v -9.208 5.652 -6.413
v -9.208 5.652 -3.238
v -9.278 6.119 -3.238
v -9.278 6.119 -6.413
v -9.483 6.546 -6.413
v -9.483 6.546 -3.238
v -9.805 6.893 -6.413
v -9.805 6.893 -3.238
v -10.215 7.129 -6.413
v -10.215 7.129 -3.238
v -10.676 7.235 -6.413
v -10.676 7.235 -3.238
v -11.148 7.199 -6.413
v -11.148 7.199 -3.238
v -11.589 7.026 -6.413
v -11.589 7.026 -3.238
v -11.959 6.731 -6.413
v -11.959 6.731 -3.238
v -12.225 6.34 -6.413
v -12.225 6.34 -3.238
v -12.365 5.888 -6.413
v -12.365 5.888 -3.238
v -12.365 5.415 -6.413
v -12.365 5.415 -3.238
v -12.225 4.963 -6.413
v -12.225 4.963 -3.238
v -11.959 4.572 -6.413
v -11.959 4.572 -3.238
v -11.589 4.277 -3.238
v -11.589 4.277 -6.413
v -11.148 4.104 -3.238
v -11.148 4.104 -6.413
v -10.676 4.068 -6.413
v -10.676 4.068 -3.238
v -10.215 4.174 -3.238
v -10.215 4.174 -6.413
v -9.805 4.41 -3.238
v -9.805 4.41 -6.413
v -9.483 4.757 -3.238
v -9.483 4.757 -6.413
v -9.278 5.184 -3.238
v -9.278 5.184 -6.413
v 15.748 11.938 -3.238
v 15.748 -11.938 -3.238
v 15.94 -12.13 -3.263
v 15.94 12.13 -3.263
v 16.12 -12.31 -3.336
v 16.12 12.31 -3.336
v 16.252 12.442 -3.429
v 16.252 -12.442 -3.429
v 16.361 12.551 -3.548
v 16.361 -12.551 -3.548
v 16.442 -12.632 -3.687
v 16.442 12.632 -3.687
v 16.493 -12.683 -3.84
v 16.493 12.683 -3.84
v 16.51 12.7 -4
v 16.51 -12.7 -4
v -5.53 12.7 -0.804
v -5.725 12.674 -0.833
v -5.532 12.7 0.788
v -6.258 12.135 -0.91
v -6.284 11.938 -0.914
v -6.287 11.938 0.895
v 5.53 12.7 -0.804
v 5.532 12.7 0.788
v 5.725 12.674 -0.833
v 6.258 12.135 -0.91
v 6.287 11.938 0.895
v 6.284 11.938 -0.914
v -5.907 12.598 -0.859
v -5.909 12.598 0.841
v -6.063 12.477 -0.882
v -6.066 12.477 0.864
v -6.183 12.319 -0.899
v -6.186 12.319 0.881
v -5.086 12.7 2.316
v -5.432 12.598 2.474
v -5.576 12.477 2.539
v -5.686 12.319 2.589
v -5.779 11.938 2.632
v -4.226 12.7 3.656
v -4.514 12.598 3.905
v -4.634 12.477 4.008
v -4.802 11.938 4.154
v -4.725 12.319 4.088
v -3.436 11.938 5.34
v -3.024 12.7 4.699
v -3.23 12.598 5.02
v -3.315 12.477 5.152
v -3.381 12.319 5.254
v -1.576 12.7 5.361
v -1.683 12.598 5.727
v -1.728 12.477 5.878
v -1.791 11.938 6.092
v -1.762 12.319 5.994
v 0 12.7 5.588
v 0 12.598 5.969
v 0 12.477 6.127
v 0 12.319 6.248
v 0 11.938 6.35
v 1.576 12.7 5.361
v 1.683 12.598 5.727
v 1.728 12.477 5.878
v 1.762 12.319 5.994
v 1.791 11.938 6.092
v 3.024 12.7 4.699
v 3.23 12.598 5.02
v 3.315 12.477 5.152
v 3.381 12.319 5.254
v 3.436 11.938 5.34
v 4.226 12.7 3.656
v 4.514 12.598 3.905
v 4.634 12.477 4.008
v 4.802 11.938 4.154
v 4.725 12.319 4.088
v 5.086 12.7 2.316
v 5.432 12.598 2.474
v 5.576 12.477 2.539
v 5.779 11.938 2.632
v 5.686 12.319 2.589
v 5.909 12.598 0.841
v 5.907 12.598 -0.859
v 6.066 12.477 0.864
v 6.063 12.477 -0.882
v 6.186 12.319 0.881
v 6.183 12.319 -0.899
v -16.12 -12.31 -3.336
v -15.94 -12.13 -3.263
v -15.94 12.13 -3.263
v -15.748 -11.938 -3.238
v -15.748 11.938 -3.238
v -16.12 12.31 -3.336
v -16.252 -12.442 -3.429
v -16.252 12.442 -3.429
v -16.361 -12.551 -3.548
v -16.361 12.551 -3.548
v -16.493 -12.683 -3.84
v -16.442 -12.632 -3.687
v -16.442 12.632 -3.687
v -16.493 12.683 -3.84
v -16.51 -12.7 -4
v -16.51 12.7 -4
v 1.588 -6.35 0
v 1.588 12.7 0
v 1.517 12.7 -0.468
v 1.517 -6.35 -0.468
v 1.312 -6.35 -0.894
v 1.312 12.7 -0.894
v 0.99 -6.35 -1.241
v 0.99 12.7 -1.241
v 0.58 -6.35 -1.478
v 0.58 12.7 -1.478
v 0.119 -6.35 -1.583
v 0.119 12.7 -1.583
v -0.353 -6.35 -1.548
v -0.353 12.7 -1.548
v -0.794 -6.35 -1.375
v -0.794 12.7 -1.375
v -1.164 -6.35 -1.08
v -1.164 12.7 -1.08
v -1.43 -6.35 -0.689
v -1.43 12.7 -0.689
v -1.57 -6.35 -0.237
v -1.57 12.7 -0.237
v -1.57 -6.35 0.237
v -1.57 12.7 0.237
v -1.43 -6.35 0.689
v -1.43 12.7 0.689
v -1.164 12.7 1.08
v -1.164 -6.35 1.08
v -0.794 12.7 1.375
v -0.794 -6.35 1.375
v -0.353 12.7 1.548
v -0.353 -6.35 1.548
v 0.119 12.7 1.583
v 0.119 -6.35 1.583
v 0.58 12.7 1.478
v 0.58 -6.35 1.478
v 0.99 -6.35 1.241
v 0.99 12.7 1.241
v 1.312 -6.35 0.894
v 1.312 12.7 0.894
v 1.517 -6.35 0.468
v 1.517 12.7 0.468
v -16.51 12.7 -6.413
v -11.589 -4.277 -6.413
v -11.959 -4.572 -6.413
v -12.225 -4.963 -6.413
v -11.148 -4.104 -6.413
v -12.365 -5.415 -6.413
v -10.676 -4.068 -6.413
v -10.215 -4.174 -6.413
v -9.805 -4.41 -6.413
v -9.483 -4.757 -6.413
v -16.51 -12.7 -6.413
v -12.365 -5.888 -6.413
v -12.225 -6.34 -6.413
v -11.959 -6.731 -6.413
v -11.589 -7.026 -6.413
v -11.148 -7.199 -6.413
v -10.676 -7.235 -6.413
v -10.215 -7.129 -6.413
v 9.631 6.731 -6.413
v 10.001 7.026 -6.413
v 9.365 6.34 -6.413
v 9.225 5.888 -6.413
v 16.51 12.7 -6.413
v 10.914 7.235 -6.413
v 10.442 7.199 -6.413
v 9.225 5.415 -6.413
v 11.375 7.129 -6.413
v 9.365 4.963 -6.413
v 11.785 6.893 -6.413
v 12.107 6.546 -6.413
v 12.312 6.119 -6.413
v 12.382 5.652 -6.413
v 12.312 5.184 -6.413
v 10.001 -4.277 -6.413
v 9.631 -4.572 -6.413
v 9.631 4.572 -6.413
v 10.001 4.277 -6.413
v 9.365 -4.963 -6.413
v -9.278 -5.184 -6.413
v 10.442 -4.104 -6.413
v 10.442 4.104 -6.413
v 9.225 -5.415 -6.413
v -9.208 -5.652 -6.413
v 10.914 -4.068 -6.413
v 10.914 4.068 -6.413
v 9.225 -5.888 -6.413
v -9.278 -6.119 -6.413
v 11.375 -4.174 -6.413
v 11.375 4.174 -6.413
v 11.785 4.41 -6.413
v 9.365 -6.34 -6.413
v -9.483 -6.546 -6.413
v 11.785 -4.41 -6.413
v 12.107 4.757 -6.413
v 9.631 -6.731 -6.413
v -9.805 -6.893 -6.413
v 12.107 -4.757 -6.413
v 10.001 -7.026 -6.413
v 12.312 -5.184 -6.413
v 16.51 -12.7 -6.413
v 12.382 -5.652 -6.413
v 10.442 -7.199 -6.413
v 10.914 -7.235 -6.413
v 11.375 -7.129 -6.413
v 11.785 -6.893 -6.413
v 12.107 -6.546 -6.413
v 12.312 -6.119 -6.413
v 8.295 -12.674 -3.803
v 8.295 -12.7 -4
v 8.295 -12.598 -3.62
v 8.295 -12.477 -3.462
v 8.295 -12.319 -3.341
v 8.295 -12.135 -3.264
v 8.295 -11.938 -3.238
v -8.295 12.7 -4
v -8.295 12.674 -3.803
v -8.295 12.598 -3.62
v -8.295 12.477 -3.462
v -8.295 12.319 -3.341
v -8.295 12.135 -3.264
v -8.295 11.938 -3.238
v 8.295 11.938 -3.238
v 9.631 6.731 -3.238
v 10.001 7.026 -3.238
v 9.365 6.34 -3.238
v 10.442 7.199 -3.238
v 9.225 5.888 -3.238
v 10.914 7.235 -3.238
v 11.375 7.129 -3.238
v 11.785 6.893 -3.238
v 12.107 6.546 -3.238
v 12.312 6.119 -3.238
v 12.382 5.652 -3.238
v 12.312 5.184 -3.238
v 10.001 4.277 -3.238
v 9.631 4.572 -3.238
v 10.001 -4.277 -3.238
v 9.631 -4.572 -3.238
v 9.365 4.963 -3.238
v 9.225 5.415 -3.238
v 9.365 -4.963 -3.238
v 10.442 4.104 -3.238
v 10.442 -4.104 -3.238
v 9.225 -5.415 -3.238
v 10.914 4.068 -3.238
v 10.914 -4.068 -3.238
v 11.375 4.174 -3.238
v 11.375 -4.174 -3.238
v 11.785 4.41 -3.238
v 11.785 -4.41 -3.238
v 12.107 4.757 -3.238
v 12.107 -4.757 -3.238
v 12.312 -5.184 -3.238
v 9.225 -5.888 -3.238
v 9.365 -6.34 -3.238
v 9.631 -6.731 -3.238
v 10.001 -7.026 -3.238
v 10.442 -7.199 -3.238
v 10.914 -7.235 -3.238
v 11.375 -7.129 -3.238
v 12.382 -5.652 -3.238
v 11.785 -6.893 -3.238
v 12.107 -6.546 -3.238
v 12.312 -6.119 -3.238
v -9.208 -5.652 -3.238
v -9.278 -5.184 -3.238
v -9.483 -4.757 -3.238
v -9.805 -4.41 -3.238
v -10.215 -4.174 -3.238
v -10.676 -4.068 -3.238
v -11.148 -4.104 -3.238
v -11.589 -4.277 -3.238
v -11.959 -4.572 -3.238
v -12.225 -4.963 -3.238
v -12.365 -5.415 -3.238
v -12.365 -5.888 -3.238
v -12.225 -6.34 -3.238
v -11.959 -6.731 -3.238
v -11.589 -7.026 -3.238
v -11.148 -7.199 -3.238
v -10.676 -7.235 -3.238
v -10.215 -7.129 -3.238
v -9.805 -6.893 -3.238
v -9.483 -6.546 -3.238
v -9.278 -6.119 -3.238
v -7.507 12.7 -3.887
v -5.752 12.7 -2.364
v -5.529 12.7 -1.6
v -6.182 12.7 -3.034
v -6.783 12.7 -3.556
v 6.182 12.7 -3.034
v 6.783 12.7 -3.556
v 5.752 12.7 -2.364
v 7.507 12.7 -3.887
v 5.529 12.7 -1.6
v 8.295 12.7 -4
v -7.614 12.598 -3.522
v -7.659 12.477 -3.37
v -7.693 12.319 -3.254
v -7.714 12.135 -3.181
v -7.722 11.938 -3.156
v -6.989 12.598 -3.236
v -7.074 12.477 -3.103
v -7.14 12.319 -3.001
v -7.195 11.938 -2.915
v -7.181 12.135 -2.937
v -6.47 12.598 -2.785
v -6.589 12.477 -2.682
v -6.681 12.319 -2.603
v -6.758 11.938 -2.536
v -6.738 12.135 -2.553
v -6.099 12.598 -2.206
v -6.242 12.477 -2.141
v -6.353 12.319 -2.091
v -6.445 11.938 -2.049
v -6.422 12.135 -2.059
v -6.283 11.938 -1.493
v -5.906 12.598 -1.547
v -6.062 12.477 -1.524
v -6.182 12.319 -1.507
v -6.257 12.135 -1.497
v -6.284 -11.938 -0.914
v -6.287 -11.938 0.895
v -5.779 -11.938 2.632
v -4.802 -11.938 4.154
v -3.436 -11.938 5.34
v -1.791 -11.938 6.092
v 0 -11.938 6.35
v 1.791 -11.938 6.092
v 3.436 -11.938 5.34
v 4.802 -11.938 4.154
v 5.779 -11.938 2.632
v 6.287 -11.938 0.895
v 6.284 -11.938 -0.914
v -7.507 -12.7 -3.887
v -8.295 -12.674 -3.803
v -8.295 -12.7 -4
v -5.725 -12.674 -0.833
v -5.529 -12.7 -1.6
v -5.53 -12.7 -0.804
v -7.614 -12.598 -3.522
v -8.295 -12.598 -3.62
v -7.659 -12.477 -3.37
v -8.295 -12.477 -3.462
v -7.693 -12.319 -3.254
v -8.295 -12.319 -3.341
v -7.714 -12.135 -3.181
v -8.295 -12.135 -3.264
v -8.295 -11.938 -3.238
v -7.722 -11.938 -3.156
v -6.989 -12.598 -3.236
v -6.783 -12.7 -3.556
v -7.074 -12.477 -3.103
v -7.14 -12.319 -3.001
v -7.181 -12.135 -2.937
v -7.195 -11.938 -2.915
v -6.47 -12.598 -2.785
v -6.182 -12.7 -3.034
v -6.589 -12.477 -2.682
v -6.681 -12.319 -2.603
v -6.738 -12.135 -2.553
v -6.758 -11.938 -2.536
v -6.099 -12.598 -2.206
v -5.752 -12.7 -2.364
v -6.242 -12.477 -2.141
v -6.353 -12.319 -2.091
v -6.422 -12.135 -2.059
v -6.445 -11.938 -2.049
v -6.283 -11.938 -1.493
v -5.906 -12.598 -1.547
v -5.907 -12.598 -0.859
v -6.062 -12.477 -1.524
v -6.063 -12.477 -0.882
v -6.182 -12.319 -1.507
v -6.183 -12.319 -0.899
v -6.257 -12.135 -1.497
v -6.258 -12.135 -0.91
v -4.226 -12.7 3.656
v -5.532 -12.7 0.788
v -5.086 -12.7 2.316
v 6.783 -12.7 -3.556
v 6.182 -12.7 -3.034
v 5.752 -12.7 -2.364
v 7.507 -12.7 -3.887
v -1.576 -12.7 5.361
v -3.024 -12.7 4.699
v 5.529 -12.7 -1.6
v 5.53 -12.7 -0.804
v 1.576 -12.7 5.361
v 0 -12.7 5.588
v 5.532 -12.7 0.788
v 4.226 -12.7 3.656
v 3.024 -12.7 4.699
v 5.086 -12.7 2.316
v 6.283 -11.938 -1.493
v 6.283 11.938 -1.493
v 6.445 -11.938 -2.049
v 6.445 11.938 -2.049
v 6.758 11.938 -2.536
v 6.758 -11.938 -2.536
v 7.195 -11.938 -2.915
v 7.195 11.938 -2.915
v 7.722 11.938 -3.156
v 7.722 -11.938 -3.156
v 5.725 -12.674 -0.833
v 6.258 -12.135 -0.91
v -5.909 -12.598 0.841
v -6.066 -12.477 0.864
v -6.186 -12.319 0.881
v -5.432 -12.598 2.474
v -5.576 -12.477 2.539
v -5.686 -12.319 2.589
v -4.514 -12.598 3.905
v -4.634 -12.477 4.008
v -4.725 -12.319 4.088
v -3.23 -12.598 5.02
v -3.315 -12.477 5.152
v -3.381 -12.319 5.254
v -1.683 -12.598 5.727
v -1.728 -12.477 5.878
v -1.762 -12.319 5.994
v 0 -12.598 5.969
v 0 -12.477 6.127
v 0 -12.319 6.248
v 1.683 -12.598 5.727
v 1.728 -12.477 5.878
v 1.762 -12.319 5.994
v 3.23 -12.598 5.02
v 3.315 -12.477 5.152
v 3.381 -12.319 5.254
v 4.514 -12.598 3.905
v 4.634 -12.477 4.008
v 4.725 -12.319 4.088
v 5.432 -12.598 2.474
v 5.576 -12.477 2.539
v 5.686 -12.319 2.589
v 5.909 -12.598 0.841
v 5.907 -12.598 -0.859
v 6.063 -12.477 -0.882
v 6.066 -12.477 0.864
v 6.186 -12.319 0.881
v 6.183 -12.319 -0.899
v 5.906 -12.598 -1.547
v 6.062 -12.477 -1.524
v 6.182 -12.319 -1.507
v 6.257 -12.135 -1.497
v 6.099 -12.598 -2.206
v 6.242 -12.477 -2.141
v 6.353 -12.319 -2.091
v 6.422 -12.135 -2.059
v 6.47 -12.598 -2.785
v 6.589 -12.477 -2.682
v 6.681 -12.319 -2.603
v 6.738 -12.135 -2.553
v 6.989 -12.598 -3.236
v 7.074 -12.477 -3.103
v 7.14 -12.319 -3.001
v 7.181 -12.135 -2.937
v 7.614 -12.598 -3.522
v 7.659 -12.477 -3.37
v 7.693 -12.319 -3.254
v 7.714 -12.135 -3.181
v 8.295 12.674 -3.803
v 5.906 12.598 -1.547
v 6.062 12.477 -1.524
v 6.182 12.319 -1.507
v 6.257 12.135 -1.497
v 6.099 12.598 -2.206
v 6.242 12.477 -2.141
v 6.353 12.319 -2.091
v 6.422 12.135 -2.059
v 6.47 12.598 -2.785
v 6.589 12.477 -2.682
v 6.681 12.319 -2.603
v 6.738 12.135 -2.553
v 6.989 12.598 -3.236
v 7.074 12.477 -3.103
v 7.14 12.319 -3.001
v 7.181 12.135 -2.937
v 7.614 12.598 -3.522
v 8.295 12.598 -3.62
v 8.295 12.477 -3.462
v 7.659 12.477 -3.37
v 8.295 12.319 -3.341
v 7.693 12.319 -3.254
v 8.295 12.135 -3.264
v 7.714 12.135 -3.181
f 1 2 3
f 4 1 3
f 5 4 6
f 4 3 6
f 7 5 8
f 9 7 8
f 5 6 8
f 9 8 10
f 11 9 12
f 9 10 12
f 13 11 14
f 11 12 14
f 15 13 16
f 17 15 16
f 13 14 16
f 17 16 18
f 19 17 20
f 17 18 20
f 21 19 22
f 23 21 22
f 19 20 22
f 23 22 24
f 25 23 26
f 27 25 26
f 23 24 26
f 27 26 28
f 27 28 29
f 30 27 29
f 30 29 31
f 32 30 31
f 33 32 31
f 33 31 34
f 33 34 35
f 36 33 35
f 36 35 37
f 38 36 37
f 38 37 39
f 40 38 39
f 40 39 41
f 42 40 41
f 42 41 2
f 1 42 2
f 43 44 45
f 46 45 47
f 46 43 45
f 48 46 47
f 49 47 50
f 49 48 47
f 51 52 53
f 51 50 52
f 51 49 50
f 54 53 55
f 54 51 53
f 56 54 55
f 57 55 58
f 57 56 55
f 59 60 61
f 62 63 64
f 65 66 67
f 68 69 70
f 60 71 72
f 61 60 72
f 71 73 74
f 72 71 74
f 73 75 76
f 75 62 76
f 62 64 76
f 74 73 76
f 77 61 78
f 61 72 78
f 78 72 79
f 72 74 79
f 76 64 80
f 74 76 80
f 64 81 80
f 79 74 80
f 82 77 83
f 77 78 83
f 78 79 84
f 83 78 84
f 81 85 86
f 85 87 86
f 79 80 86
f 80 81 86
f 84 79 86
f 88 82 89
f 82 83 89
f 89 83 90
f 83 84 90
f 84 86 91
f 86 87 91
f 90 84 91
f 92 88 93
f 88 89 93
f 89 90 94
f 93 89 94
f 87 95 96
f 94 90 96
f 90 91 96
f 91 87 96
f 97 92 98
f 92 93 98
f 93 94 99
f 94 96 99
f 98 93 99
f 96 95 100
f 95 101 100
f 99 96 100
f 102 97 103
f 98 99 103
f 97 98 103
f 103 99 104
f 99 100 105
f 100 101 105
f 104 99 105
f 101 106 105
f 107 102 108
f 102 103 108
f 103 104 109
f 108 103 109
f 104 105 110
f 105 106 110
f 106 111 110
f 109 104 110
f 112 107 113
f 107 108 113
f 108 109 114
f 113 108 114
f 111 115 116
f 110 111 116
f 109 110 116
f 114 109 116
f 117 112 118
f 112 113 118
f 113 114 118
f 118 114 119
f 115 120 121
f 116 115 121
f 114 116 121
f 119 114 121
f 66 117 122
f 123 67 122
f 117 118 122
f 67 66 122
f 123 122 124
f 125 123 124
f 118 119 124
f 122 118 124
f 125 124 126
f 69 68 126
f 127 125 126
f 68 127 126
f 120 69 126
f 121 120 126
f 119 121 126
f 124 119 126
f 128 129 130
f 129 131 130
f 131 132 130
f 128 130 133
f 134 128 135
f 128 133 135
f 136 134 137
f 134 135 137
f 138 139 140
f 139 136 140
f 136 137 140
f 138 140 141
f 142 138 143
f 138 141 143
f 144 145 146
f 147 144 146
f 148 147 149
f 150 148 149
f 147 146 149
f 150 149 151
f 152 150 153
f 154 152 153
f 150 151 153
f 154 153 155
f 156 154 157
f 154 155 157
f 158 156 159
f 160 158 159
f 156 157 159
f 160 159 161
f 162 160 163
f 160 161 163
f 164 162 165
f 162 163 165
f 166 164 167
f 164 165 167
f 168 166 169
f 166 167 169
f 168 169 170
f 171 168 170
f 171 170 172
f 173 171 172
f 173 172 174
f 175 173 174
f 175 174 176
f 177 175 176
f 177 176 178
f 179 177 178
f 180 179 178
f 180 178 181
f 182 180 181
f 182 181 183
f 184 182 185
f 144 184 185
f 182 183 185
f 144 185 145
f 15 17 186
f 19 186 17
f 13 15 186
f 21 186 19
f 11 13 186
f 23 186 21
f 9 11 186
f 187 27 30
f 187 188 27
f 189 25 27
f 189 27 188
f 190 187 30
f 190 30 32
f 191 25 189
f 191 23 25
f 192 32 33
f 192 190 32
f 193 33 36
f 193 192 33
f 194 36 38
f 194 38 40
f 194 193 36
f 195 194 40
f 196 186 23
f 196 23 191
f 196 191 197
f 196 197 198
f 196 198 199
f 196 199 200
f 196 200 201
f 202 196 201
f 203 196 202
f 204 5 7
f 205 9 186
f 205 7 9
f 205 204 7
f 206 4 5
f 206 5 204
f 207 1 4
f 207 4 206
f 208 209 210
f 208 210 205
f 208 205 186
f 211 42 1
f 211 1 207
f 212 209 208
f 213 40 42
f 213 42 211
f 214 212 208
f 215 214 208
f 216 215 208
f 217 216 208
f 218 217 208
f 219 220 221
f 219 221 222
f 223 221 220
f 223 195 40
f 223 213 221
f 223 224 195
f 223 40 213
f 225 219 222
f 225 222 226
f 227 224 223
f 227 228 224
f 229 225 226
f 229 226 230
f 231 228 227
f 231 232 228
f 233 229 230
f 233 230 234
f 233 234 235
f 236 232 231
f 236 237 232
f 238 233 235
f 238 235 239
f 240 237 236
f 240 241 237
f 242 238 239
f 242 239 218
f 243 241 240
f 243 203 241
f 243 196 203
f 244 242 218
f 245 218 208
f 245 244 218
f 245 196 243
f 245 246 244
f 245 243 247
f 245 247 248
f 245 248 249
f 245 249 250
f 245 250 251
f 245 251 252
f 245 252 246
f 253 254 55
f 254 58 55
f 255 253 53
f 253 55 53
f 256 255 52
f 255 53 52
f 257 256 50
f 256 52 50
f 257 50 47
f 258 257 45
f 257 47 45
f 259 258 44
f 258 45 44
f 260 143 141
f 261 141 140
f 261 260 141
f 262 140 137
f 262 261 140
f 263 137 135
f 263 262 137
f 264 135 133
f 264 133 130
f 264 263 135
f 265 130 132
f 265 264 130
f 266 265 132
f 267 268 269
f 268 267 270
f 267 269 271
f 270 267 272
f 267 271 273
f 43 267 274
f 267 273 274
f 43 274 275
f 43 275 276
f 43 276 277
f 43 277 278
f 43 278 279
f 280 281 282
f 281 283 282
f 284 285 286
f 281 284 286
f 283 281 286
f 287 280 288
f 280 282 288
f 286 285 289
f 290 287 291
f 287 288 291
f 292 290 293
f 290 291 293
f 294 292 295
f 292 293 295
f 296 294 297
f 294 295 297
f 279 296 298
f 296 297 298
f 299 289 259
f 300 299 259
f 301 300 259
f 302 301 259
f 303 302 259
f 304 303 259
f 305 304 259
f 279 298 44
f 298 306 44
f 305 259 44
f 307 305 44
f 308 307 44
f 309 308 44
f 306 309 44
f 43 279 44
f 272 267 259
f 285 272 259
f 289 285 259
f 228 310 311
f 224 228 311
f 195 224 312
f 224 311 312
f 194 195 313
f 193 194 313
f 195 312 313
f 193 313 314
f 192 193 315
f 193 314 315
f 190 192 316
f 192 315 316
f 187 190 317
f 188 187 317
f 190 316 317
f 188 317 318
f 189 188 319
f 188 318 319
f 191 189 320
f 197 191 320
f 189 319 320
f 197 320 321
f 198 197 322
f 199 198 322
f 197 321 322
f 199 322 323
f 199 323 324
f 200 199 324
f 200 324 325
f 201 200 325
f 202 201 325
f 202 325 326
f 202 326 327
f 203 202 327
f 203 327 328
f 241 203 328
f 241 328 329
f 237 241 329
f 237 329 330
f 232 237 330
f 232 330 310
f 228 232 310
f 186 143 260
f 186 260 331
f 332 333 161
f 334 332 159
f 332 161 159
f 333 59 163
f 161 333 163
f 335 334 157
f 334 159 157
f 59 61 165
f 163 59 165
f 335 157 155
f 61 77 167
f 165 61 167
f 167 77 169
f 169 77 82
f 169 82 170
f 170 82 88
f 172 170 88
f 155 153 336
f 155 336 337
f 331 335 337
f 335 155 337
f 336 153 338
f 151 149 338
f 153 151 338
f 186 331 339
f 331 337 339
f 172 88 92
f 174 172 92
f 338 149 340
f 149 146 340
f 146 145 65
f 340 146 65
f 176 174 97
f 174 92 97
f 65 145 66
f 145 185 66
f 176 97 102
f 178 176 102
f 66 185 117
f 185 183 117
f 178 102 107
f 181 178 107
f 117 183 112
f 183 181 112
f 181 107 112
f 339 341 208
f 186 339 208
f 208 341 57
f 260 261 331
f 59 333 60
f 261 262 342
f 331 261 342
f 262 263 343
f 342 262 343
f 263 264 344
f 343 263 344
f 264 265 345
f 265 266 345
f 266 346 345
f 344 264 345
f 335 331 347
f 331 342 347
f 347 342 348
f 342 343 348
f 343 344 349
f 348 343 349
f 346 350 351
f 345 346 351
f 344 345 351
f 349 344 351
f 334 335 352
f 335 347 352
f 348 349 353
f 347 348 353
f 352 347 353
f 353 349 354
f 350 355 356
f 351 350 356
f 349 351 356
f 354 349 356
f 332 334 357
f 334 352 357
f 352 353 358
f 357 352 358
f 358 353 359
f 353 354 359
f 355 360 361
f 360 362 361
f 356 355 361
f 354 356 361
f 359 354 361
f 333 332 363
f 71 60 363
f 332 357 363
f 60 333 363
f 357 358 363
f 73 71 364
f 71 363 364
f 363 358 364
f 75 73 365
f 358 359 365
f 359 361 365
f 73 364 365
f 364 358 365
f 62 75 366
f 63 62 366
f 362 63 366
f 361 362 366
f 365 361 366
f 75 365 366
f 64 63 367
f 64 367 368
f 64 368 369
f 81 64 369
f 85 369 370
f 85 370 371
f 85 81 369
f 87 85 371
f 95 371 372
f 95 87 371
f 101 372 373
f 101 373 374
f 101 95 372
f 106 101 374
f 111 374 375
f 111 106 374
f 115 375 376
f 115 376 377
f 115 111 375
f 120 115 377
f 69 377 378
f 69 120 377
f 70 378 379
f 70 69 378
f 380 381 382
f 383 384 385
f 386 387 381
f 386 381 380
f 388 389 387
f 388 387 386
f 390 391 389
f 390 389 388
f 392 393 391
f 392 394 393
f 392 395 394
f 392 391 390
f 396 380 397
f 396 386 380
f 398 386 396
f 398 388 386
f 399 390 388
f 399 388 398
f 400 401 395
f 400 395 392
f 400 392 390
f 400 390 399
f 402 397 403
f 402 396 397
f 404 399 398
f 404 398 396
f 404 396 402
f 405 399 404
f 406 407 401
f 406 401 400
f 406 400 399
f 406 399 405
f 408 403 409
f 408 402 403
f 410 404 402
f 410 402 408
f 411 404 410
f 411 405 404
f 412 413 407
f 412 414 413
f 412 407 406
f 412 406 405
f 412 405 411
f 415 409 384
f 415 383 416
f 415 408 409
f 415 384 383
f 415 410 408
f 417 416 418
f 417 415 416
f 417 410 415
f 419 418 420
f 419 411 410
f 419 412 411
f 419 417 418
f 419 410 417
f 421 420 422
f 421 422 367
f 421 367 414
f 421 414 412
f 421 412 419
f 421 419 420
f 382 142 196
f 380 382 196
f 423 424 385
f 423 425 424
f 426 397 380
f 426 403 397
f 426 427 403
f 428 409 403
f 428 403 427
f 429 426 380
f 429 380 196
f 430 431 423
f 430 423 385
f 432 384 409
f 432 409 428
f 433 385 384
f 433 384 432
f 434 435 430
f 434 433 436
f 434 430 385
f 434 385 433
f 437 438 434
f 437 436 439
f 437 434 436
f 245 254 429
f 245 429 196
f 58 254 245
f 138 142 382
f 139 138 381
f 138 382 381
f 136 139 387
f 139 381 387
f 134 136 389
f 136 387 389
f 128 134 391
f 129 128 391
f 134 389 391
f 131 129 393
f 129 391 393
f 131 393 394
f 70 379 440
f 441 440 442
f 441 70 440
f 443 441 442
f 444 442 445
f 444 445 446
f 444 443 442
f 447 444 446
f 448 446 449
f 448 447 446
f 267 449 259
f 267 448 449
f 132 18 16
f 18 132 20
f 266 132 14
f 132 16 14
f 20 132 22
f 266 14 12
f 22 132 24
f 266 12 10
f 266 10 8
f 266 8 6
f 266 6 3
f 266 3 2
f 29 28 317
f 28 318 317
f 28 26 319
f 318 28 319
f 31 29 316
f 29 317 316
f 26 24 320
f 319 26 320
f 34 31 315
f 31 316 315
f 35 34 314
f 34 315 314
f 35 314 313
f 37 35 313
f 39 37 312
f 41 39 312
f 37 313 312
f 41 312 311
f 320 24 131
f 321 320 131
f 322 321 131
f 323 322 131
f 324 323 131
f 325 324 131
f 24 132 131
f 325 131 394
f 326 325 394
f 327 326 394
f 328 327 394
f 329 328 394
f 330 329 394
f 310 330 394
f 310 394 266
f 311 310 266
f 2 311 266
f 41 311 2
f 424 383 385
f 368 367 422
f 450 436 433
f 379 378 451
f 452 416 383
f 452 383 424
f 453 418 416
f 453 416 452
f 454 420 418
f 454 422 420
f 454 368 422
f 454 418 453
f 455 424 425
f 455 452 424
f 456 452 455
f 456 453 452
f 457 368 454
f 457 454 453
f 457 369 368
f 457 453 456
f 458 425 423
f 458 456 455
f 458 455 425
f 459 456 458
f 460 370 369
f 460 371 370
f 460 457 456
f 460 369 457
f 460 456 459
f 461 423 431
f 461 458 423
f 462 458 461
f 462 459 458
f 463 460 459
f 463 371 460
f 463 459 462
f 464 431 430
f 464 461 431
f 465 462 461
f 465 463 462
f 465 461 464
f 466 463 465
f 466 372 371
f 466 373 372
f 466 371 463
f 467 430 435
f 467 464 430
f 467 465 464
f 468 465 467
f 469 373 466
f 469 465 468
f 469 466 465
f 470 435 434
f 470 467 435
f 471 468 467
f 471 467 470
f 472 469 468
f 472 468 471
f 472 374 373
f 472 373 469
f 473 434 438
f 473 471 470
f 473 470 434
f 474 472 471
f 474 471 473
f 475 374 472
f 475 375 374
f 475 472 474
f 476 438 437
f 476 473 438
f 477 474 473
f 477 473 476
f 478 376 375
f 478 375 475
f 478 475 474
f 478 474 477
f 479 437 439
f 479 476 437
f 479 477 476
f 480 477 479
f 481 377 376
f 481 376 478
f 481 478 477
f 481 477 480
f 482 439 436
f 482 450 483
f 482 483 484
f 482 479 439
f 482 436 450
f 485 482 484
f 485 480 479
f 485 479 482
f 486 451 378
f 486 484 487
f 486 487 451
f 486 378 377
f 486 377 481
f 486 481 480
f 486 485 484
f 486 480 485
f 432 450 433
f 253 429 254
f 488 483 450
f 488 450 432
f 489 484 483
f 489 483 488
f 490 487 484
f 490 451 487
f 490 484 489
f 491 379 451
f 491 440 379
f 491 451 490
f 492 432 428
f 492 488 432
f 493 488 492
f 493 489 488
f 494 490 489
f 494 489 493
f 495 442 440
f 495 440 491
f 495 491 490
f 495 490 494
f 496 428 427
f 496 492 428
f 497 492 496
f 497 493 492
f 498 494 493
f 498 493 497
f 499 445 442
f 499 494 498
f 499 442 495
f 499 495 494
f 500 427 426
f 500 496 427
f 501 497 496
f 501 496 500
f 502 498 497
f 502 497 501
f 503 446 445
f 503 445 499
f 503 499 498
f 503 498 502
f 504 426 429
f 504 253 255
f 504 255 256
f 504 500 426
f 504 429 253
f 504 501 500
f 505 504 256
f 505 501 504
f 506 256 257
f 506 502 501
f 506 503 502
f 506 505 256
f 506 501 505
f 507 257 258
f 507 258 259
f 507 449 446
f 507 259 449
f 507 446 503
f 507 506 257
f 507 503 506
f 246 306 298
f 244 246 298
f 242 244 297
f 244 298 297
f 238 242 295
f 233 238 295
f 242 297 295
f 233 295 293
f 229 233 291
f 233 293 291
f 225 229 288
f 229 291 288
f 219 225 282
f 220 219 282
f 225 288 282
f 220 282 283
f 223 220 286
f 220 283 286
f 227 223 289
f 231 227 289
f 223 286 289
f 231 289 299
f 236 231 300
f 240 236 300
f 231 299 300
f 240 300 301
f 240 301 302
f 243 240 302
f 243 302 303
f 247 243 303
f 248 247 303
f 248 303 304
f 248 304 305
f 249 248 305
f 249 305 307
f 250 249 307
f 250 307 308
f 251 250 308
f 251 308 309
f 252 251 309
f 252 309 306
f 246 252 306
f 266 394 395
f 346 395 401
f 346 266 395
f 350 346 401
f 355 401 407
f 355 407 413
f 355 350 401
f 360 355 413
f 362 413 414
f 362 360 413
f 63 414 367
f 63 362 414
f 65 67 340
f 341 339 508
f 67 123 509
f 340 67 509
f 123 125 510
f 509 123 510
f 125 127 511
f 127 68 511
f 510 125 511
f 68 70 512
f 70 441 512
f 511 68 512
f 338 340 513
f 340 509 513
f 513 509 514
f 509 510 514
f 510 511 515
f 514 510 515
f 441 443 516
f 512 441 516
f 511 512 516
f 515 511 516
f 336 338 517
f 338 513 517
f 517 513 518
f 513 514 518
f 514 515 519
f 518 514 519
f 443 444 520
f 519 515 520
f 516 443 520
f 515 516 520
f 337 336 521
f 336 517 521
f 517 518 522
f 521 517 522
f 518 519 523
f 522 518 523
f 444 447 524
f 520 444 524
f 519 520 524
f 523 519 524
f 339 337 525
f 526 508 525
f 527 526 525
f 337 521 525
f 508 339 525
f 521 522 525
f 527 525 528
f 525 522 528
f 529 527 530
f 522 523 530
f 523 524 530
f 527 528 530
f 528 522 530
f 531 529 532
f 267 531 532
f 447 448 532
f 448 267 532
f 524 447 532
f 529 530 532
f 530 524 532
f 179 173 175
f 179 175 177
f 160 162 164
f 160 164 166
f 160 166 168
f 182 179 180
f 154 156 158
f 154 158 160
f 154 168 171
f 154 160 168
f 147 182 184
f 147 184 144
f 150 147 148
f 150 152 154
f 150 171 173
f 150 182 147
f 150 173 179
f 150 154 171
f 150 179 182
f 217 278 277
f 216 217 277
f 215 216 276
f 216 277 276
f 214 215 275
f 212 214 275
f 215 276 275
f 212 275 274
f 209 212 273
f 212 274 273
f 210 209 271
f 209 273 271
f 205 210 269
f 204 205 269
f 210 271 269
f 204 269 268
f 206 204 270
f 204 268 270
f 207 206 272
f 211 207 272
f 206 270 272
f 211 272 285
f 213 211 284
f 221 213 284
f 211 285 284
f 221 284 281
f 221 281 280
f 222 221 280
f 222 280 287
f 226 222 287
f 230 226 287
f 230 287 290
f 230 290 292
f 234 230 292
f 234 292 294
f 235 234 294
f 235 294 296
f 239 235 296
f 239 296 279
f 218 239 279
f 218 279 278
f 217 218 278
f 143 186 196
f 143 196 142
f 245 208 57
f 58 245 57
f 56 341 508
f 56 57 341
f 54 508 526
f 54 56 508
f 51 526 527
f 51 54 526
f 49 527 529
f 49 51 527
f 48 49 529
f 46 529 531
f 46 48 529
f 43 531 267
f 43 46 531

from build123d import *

# Parameters (mm, degrees)
SKETCH1_R           = 6.35
BOSS_EXTRUDE1_DEPTH = 12.7
SKETCH2_W           = 33.02
SKETCH2_H           = 3.175
BOSS_EXTRUDE2_DEPTH = 25.4
CUT_EXTRUDE1_REACH  = 5.175
SKETCH4_R           = 1.5875
SKETCH5_R           = 1.5875
CUT_EXTRUDE2_DEPTH  = 19.05
FILLET2_R           = 2.032
FILLET3_R           = 0.762


with BuildPart() as part:
    # Sketch1 → Boss-Extrude1 (new body, symmetric)
    with BuildSketch(Plane(origin=(0, 0, 0), x_dir=(1, 0, 0), z_dir=(0, 1, 0))):
        Circle(SKETCH1_R)
    extrude(amount=BOSS_EXTRUDE1_DEPTH, both=True)

    # Sketch2 → Boss-Extrude2 (add)
    with BuildSketch(Plane.XZ.offset(12.7)):
        with Locations((0, -4.826)):
            Rectangle(SKETCH2_W, SKETCH2_H)
    extrude(amount=-BOSS_EXTRUDE2_DEPTH)

    # Sketch4 → Cut-Extrude1 (cut, up to next)
    with BuildSketch(Plane.XY.offset(-3.2385), mode=Mode.PRIVATE) as cut_extrude1_sk1:
        with Locations((10.795, 5.6515)):
            Circle(SKETCH4_R)
    cut_extrude1_tool1 = extrude(cut_extrude1_sk1.sketch, amount=-CUT_EXTRUDE1_REACH, mode=Mode.PRIVATE) & part.part
    add(cut_extrude1_tool1.solids().sort_by_distance((10.795, 5.6515, -3.2385))[0], mode=Mode.SUBTRACT)
    # Sketch4 → Cut-Extrude1 (cut, up to next)
    with BuildSketch(Plane.XY.offset(-3.2385), mode=Mode.PRIVATE) as cut_extrude1_sk2:
        with Locations((10.795, -5.6515)):
            Circle(SKETCH4_R)
    cut_extrude1_tool2 = extrude(cut_extrude1_sk2.sketch, amount=-CUT_EXTRUDE1_REACH, mode=Mode.PRIVATE) & part.part
    add(cut_extrude1_tool2.solids().sort_by_distance((10.795, -5.6515, -3.2385))[0], mode=Mode.SUBTRACT)
    # Sketch4 → Cut-Extrude1 (cut, up to next)
    with BuildSketch(Plane.XY.offset(-3.2385), mode=Mode.PRIVATE) as cut_extrude1_sk3:
        with Locations((-10.795, -5.6515)):
            Circle(SKETCH4_R)
    cut_extrude1_tool3 = extrude(cut_extrude1_sk3.sketch, amount=-CUT_EXTRUDE1_REACH, mode=Mode.PRIVATE) & part.part
    add(cut_extrude1_tool3.solids().sort_by_distance((-10.795, -5.6515, -3.2385))[0], mode=Mode.SUBTRACT)
    # Sketch4 → Cut-Extrude1 (cut, up to next)
    with BuildSketch(Plane.XY.offset(-3.2385), mode=Mode.PRIVATE) as cut_extrude1_sk4:
        with Locations((-10.795, 5.6515)):
            Circle(SKETCH4_R)
    cut_extrude1_tool4 = extrude(cut_extrude1_sk4.sketch, amount=-CUT_EXTRUDE1_REACH, mode=Mode.PRIVATE) & part.part
    add(cut_extrude1_tool4.solids().sort_by_distance((-10.795, 5.6515, -3.2385))[0], mode=Mode.SUBTRACT)

    # Sketch5 → Cut-Extrude2 (cut)
    with BuildSketch(Plane(origin=(0, 12.7, 0), x_dir=(1, 0, 0), z_dir=(0, 1, 0))):
        Circle(SKETCH5_R)
    extrude(amount=-CUT_EXTRUDE2_DEPTH, mode=Mode.SUBTRACT)

    # Fillet2
    fillet2_edges = [part.edges().sort_by_distance(p)[0] for p in [
        (-5.462107446, 0, -3.2385),
        (5.462107446, 0, -3.2385),
    ]]
    fillet(fillet2_edges, radius=FILLET2_R)

    # Fillet3
    fillet3_edges = [part.edges().sort_by_distance(p)[0] for p in [
        (12.402357042, -12.7, -3.2385),
        (0, 12.7, 6.35),
        (0, -12.7, 6.35),
        (-12.402357042, 12.7, -3.2385),
        (-12.402357042, -12.7, -3.2385),
        (-6.757939343, -12.7, -2.535916185),
        (-6.757939343, 12.7, -2.535916185),
        (6.757939343, 12.7, -2.535916185),
        (6.757939343, -12.7, -2.535916185),
        (-16.51, 0, -3.2385),
        (12.402357042, 12.7, -3.2385),
        (16.51, 0, -3.2385),
    ]]
    fillet(fillet3_edges, radius=FILLET3_R)


solid = part.part
